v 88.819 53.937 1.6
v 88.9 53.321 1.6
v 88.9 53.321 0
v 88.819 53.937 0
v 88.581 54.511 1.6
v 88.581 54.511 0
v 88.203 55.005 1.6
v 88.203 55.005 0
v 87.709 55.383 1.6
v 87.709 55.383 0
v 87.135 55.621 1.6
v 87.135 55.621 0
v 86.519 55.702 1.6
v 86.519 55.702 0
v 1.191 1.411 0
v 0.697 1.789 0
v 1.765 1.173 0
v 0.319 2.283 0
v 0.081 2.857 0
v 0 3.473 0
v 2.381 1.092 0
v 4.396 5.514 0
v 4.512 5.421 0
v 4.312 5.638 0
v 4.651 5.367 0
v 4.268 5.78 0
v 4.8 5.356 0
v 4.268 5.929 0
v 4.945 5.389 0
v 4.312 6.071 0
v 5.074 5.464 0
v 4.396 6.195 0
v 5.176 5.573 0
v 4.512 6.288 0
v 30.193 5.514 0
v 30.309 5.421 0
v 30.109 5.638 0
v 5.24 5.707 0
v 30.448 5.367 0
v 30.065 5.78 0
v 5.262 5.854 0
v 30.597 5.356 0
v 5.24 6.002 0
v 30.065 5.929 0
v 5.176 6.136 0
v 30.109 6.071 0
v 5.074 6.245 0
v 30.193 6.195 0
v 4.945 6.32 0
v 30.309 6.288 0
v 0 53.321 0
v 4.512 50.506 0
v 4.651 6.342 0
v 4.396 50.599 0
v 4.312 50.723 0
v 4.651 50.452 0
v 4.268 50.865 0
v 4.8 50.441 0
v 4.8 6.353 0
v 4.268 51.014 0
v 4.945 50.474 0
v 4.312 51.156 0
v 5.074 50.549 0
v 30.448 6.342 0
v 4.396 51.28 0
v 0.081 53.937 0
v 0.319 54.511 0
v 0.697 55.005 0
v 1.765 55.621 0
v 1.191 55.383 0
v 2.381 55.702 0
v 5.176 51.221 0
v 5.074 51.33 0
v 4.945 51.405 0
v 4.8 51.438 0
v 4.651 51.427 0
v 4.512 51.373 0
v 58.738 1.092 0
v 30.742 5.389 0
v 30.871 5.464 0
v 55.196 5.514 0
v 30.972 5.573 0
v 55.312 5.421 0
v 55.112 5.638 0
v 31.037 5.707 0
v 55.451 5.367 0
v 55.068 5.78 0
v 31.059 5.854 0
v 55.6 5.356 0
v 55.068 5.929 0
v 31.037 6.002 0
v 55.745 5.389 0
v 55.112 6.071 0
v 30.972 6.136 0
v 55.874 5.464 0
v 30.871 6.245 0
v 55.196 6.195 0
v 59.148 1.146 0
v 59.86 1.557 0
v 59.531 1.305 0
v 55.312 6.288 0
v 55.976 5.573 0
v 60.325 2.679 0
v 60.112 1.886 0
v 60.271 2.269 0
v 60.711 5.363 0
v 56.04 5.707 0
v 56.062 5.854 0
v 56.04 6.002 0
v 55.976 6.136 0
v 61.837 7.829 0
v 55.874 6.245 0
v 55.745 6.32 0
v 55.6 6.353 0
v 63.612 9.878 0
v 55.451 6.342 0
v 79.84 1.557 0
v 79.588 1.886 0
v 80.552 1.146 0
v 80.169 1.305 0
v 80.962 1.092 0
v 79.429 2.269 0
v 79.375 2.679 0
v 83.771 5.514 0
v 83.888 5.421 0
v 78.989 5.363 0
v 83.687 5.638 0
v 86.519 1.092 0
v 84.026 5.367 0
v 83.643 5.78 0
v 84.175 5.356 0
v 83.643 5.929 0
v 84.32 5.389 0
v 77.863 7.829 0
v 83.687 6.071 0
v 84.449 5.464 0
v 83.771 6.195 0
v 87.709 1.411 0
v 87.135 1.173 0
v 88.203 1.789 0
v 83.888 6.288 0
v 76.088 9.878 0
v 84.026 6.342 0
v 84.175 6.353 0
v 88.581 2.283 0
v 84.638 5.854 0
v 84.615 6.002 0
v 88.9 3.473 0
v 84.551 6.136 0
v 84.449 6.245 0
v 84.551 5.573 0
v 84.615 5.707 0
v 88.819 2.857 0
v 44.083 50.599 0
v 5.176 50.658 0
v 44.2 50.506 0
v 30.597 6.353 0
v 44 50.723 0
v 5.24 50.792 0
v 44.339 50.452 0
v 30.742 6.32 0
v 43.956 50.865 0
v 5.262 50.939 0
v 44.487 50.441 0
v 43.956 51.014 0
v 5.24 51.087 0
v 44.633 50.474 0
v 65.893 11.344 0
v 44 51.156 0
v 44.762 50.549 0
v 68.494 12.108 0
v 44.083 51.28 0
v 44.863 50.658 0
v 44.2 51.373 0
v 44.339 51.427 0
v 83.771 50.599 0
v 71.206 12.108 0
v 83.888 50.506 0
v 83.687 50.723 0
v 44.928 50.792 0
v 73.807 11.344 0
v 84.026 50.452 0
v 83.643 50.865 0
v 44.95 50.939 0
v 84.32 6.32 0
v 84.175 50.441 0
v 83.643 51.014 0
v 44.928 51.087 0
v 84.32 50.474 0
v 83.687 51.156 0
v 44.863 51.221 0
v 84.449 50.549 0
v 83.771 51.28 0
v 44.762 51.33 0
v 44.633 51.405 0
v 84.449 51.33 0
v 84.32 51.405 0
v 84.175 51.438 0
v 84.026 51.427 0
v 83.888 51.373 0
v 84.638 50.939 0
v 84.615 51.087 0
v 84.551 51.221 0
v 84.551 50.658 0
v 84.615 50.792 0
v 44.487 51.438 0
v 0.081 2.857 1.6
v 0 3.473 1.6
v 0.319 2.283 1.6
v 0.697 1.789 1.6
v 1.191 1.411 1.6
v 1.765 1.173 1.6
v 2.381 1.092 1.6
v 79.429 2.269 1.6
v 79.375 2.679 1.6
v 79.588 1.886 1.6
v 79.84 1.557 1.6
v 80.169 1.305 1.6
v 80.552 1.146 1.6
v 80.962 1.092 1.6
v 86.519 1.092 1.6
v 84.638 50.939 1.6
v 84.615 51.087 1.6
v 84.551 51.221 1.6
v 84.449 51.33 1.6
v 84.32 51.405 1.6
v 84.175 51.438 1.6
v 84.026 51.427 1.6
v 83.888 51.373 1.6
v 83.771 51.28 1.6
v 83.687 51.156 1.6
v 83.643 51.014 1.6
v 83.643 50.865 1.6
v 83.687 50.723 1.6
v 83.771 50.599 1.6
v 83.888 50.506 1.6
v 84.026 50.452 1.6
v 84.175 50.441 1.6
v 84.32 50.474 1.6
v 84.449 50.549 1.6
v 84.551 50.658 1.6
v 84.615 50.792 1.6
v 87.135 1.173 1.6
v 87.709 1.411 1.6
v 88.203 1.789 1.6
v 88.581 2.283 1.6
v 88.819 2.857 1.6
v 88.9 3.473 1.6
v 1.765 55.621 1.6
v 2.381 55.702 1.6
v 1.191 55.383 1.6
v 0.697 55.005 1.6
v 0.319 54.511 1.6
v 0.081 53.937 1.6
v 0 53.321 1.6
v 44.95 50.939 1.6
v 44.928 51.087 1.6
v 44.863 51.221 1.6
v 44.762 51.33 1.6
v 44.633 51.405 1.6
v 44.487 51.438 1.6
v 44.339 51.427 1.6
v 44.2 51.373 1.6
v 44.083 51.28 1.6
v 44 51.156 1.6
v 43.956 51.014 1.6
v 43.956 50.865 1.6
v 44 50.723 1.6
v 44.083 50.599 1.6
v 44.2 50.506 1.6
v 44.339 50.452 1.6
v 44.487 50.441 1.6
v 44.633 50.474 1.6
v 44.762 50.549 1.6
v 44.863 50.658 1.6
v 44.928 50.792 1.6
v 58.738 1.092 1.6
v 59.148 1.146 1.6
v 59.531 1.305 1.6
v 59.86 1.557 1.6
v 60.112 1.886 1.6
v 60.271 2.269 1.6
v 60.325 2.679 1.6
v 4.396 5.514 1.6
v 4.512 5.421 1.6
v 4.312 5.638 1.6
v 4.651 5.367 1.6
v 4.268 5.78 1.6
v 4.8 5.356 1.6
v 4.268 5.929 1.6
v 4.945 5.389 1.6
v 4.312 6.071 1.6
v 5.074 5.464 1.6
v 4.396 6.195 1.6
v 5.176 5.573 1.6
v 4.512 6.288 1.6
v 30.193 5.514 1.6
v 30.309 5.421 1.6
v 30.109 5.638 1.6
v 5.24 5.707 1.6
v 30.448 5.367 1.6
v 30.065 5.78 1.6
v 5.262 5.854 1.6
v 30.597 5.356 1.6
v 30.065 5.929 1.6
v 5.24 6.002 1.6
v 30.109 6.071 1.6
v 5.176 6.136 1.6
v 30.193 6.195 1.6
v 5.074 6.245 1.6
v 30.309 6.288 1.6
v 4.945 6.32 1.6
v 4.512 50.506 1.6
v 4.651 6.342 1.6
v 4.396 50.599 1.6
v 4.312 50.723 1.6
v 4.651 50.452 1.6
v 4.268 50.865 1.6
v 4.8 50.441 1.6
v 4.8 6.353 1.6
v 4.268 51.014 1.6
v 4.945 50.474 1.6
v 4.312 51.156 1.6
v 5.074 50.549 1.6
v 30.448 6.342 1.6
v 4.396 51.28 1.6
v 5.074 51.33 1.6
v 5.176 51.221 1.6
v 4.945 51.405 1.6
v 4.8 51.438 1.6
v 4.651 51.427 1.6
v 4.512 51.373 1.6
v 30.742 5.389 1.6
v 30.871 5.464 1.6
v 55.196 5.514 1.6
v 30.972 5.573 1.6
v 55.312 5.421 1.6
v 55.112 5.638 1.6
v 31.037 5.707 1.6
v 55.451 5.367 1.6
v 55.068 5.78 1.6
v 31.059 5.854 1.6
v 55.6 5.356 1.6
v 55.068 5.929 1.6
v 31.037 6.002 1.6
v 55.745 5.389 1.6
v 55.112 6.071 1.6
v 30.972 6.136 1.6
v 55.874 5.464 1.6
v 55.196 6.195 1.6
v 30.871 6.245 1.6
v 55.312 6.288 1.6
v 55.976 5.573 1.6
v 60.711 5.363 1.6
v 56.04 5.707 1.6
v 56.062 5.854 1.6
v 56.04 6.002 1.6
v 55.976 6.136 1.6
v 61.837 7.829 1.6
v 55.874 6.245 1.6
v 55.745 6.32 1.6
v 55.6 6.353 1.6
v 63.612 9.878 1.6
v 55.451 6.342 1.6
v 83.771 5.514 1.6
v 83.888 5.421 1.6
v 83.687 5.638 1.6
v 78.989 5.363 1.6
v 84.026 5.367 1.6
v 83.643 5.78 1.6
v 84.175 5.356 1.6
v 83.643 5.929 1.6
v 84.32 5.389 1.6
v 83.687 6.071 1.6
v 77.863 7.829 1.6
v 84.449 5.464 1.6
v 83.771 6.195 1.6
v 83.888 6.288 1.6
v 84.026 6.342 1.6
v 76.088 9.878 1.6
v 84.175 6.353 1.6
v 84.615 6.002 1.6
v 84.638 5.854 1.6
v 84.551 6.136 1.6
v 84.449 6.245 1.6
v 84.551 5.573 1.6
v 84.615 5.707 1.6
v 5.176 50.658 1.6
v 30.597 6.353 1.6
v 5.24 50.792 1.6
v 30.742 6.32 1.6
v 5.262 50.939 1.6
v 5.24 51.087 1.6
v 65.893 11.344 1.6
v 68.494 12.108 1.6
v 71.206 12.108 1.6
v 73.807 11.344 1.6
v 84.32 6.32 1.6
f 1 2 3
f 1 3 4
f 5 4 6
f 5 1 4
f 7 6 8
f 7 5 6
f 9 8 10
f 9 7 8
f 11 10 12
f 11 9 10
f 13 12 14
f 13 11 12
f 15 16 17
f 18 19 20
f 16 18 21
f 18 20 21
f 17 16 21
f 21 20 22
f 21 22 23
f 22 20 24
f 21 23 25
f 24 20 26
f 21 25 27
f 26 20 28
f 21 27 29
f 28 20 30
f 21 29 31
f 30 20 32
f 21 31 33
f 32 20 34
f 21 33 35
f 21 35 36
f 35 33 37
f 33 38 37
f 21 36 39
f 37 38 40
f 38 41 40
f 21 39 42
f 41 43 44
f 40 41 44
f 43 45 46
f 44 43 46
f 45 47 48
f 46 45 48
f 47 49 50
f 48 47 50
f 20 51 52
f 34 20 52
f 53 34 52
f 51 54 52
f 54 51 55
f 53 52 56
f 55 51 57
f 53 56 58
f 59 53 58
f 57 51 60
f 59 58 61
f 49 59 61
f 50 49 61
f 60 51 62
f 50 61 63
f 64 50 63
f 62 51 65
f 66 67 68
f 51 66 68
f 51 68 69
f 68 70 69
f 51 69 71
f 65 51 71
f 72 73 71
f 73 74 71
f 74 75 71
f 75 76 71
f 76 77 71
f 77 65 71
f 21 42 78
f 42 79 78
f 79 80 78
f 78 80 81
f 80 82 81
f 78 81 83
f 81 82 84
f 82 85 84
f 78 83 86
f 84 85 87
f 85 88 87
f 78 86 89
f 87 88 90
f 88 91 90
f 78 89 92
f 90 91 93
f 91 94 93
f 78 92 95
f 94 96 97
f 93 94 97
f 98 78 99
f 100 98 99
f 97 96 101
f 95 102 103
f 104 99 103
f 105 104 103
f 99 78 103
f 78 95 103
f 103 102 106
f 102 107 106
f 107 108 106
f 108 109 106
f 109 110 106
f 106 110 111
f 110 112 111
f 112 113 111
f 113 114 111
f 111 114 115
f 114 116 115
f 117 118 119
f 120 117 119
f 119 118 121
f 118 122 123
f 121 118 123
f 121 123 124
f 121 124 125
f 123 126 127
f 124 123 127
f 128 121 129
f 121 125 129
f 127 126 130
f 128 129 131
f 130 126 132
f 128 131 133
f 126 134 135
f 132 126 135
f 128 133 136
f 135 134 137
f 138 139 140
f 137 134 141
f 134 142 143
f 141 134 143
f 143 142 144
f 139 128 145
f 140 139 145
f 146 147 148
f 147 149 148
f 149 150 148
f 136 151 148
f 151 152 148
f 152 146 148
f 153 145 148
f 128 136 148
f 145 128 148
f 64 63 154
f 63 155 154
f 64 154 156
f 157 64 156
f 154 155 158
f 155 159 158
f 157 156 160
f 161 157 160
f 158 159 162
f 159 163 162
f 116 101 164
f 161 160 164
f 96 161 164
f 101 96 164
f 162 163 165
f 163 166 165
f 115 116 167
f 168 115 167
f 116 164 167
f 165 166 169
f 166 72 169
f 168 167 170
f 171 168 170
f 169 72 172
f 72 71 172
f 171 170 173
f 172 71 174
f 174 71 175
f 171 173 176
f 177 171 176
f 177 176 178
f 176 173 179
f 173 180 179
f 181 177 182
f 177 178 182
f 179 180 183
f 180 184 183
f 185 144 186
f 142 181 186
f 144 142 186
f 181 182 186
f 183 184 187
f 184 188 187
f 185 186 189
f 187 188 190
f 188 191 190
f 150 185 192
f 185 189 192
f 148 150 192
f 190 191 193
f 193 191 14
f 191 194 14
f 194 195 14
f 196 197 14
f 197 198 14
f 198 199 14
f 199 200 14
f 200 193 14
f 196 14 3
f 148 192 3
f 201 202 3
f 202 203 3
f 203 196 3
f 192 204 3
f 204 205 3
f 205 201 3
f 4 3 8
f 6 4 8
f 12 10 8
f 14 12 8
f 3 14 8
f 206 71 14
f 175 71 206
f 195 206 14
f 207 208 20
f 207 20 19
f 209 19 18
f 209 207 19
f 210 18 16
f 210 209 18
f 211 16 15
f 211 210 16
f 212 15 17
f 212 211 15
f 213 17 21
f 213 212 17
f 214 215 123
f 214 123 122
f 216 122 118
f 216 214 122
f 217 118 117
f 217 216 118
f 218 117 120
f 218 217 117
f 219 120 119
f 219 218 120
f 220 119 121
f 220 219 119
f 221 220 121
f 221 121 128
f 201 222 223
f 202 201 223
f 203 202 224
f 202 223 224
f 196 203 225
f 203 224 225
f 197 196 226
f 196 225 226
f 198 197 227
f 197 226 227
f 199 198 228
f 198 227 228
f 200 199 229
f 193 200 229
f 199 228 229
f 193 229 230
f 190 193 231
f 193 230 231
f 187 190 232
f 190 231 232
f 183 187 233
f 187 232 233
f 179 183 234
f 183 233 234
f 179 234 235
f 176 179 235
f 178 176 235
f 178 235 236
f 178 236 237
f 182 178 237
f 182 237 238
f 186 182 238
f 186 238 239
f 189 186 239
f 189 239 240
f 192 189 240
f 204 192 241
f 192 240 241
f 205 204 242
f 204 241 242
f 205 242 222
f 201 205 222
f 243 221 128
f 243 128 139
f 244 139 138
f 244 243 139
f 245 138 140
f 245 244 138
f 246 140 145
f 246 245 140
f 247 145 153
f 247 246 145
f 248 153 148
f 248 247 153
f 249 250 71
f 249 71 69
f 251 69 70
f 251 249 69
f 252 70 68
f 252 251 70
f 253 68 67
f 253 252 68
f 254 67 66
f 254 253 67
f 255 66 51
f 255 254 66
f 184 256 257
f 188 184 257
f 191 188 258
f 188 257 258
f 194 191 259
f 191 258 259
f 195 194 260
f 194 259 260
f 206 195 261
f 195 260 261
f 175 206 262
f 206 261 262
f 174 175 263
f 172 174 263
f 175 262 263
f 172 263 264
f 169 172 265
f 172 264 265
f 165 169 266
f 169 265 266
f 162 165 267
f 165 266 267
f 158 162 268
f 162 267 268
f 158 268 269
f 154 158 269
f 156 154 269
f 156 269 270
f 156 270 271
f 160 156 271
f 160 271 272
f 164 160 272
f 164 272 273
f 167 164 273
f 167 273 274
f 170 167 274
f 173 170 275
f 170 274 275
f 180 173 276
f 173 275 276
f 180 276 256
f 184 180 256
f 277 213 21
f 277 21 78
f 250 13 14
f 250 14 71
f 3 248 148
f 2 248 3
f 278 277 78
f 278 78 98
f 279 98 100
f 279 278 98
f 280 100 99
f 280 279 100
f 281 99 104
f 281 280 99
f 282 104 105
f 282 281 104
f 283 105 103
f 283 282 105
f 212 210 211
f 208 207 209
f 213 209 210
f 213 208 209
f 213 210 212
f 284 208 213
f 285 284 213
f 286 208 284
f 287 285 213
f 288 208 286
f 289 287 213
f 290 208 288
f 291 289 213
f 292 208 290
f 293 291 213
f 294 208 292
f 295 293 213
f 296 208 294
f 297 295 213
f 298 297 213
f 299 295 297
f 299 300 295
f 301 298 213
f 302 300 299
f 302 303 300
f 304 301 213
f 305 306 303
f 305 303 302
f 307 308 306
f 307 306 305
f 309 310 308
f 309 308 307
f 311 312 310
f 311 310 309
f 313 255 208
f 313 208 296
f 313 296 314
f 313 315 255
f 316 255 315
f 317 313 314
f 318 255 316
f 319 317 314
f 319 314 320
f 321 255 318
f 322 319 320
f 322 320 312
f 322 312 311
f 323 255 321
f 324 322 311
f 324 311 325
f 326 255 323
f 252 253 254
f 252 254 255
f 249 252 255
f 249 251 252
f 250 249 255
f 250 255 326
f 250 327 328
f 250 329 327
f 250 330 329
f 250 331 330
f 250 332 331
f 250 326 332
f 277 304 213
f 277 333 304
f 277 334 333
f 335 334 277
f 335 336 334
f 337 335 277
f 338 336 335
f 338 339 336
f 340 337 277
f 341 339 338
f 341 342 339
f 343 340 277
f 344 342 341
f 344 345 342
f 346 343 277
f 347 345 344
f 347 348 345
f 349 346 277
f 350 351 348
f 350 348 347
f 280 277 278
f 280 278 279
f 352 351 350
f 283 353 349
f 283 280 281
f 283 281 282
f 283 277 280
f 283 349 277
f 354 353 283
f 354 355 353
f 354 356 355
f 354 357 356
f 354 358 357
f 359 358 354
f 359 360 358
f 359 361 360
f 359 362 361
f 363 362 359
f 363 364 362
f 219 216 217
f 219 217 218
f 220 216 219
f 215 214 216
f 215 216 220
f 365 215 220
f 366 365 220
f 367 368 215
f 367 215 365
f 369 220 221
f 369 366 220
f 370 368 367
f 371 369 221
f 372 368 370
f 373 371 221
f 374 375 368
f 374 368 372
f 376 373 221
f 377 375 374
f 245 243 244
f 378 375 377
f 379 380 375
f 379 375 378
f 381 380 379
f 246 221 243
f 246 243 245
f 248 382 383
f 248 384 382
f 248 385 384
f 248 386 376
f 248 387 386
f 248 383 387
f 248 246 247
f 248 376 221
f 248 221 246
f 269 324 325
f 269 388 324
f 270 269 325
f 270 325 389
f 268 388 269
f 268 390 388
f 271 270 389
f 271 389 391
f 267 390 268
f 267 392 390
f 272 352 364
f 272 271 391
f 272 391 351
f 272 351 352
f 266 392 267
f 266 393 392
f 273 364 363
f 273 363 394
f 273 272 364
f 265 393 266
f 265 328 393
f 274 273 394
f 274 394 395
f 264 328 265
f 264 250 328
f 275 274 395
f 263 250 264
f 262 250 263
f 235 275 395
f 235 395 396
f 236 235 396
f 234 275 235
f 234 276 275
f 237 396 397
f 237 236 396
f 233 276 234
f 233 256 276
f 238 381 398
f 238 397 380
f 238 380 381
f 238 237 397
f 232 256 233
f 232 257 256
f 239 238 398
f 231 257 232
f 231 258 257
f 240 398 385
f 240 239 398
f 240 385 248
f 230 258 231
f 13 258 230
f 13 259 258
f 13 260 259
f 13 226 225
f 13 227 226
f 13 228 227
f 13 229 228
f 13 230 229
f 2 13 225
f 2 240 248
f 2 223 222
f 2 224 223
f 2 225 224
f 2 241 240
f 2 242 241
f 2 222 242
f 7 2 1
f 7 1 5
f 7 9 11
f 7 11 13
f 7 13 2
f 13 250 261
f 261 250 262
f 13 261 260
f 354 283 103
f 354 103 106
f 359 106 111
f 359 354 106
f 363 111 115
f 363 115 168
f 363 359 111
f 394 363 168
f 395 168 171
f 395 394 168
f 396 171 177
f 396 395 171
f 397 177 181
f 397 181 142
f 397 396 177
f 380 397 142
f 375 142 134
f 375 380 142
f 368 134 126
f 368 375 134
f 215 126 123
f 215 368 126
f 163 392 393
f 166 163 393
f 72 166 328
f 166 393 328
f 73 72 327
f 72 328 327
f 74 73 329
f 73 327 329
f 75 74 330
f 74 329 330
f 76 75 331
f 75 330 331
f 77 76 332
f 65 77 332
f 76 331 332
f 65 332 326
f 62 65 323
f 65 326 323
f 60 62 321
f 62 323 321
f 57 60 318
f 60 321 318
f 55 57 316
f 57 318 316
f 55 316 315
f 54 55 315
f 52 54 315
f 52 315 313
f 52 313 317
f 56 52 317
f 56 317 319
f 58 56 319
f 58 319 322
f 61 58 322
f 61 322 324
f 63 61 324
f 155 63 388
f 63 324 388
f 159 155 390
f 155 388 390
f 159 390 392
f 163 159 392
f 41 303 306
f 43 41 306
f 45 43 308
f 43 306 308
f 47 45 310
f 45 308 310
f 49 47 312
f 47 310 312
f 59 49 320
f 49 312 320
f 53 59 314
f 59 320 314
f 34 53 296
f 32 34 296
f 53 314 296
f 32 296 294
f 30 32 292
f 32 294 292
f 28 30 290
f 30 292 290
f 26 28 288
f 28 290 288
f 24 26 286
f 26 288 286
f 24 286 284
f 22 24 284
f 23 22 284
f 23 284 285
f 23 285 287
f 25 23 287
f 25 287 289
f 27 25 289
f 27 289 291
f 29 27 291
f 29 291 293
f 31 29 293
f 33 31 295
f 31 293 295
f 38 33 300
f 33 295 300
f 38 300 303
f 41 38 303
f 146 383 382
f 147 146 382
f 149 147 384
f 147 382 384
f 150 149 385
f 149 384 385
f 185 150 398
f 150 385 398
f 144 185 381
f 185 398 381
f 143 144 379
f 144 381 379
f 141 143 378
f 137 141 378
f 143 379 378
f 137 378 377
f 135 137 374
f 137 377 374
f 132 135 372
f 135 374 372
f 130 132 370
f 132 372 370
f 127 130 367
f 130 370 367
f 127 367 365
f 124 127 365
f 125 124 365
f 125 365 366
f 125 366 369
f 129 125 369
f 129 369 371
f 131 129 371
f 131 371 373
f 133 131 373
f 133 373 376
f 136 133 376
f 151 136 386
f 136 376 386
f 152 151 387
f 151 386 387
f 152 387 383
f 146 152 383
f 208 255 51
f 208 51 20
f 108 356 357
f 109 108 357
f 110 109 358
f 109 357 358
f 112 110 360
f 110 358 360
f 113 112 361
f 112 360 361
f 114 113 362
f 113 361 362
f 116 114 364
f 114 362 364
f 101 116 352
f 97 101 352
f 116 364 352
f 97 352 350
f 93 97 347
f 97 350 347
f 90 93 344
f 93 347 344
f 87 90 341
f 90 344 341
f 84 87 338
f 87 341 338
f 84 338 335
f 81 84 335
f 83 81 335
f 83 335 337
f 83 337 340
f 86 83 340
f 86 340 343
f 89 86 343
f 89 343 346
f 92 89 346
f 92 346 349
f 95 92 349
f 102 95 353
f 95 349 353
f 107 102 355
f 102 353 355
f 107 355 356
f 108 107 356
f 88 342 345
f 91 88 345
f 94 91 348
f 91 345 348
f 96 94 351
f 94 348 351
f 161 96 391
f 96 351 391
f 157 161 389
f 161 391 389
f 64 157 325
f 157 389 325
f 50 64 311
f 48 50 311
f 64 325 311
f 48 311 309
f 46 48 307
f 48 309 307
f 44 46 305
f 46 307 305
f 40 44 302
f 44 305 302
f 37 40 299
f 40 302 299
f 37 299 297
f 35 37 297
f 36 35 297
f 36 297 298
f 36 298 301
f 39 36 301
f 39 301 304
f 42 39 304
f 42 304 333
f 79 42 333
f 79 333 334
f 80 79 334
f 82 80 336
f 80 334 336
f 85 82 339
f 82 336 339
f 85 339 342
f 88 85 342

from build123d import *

# Parameters (mm, degrees)
SKETCH1_R           = 0.5
BOSS_EXTRUDE1_DEPTH = 1.6


with BuildPart() as part:
    # Sketch1 → Boss-Extrude1 (new body)
    with BuildSketch(Plane.XY.offset(1.6)):
        with BuildLine():
            Line((0, 53.320743496), (0, 3.473243496))
            ThreePointArc((0, 3.473243496), (0.697451977, 1.789445473), (2.38125, 1.091993496))
            Line((2.38125, 1.091993496), (58.7375, 1.091993496))
            ThreePointArc((58.7375, 1.091993496), (59.860032015, 1.556961481), (60.325, 2.679493496))
            ThreePointArc((60.325, 2.679493496), (69.85, 12.204493496), (79.375, 2.679493496))
            ThreePointArc((79.375, 2.679493496), (79.839967985, 1.556961481), (80.9625, 1.091993496))
            Line((80.9625, 1.091993496), (86.51875, 1.091993496))
            ThreePointArc((86.51875, 1.091993496), (88.202548023, 1.789445473), (88.9, 3.473243496))
            Line((88.9, 3.473243496), (88.9, 53.320743496))
            ThreePointArc((88.9, 53.320743496), (88.202548023, 55.004541519), (86.51875, 55.701993496))
            Line((86.51875, 55.701993496), (2.38125, 55.701993496))
            ThreePointArc((2.38125, 55.701993496), (0.697451977, 55.004541519), (0, 53.320743496))
        make_face()
        with Locations((4.7625, 50.939493496)):
            Circle(SKETCH1_R, mode=Mode.SUBTRACT)
        with Locations((4.7625, 5.854493496)):
            Circle(SKETCH1_R, mode=Mode.SUBTRACT)
        with Locations((84.1375, 5.854493496)):
            Circle(SKETCH1_R, mode=Mode.SUBTRACT)
        with Locations((84.1375, 50.939493496)):
            Circle(SKETCH1_R, mode=Mode.SUBTRACT)
        with Locations((30.559375, 5.854493496)):
            Circle(SKETCH1_R, mode=Mode.SUBTRACT)
        with Locations((55.5625, 5.854493496)):
            Circle(SKETCH1_R, mode=Mode.SUBTRACT)
        with Locations((44.45, 50.939493496)):
            Circle(SKETCH1_R, mode=Mode.SUBTRACT)
    extrude(amount=-BOSS_EXTRUDE1_DEPTH)


solid = part.part
